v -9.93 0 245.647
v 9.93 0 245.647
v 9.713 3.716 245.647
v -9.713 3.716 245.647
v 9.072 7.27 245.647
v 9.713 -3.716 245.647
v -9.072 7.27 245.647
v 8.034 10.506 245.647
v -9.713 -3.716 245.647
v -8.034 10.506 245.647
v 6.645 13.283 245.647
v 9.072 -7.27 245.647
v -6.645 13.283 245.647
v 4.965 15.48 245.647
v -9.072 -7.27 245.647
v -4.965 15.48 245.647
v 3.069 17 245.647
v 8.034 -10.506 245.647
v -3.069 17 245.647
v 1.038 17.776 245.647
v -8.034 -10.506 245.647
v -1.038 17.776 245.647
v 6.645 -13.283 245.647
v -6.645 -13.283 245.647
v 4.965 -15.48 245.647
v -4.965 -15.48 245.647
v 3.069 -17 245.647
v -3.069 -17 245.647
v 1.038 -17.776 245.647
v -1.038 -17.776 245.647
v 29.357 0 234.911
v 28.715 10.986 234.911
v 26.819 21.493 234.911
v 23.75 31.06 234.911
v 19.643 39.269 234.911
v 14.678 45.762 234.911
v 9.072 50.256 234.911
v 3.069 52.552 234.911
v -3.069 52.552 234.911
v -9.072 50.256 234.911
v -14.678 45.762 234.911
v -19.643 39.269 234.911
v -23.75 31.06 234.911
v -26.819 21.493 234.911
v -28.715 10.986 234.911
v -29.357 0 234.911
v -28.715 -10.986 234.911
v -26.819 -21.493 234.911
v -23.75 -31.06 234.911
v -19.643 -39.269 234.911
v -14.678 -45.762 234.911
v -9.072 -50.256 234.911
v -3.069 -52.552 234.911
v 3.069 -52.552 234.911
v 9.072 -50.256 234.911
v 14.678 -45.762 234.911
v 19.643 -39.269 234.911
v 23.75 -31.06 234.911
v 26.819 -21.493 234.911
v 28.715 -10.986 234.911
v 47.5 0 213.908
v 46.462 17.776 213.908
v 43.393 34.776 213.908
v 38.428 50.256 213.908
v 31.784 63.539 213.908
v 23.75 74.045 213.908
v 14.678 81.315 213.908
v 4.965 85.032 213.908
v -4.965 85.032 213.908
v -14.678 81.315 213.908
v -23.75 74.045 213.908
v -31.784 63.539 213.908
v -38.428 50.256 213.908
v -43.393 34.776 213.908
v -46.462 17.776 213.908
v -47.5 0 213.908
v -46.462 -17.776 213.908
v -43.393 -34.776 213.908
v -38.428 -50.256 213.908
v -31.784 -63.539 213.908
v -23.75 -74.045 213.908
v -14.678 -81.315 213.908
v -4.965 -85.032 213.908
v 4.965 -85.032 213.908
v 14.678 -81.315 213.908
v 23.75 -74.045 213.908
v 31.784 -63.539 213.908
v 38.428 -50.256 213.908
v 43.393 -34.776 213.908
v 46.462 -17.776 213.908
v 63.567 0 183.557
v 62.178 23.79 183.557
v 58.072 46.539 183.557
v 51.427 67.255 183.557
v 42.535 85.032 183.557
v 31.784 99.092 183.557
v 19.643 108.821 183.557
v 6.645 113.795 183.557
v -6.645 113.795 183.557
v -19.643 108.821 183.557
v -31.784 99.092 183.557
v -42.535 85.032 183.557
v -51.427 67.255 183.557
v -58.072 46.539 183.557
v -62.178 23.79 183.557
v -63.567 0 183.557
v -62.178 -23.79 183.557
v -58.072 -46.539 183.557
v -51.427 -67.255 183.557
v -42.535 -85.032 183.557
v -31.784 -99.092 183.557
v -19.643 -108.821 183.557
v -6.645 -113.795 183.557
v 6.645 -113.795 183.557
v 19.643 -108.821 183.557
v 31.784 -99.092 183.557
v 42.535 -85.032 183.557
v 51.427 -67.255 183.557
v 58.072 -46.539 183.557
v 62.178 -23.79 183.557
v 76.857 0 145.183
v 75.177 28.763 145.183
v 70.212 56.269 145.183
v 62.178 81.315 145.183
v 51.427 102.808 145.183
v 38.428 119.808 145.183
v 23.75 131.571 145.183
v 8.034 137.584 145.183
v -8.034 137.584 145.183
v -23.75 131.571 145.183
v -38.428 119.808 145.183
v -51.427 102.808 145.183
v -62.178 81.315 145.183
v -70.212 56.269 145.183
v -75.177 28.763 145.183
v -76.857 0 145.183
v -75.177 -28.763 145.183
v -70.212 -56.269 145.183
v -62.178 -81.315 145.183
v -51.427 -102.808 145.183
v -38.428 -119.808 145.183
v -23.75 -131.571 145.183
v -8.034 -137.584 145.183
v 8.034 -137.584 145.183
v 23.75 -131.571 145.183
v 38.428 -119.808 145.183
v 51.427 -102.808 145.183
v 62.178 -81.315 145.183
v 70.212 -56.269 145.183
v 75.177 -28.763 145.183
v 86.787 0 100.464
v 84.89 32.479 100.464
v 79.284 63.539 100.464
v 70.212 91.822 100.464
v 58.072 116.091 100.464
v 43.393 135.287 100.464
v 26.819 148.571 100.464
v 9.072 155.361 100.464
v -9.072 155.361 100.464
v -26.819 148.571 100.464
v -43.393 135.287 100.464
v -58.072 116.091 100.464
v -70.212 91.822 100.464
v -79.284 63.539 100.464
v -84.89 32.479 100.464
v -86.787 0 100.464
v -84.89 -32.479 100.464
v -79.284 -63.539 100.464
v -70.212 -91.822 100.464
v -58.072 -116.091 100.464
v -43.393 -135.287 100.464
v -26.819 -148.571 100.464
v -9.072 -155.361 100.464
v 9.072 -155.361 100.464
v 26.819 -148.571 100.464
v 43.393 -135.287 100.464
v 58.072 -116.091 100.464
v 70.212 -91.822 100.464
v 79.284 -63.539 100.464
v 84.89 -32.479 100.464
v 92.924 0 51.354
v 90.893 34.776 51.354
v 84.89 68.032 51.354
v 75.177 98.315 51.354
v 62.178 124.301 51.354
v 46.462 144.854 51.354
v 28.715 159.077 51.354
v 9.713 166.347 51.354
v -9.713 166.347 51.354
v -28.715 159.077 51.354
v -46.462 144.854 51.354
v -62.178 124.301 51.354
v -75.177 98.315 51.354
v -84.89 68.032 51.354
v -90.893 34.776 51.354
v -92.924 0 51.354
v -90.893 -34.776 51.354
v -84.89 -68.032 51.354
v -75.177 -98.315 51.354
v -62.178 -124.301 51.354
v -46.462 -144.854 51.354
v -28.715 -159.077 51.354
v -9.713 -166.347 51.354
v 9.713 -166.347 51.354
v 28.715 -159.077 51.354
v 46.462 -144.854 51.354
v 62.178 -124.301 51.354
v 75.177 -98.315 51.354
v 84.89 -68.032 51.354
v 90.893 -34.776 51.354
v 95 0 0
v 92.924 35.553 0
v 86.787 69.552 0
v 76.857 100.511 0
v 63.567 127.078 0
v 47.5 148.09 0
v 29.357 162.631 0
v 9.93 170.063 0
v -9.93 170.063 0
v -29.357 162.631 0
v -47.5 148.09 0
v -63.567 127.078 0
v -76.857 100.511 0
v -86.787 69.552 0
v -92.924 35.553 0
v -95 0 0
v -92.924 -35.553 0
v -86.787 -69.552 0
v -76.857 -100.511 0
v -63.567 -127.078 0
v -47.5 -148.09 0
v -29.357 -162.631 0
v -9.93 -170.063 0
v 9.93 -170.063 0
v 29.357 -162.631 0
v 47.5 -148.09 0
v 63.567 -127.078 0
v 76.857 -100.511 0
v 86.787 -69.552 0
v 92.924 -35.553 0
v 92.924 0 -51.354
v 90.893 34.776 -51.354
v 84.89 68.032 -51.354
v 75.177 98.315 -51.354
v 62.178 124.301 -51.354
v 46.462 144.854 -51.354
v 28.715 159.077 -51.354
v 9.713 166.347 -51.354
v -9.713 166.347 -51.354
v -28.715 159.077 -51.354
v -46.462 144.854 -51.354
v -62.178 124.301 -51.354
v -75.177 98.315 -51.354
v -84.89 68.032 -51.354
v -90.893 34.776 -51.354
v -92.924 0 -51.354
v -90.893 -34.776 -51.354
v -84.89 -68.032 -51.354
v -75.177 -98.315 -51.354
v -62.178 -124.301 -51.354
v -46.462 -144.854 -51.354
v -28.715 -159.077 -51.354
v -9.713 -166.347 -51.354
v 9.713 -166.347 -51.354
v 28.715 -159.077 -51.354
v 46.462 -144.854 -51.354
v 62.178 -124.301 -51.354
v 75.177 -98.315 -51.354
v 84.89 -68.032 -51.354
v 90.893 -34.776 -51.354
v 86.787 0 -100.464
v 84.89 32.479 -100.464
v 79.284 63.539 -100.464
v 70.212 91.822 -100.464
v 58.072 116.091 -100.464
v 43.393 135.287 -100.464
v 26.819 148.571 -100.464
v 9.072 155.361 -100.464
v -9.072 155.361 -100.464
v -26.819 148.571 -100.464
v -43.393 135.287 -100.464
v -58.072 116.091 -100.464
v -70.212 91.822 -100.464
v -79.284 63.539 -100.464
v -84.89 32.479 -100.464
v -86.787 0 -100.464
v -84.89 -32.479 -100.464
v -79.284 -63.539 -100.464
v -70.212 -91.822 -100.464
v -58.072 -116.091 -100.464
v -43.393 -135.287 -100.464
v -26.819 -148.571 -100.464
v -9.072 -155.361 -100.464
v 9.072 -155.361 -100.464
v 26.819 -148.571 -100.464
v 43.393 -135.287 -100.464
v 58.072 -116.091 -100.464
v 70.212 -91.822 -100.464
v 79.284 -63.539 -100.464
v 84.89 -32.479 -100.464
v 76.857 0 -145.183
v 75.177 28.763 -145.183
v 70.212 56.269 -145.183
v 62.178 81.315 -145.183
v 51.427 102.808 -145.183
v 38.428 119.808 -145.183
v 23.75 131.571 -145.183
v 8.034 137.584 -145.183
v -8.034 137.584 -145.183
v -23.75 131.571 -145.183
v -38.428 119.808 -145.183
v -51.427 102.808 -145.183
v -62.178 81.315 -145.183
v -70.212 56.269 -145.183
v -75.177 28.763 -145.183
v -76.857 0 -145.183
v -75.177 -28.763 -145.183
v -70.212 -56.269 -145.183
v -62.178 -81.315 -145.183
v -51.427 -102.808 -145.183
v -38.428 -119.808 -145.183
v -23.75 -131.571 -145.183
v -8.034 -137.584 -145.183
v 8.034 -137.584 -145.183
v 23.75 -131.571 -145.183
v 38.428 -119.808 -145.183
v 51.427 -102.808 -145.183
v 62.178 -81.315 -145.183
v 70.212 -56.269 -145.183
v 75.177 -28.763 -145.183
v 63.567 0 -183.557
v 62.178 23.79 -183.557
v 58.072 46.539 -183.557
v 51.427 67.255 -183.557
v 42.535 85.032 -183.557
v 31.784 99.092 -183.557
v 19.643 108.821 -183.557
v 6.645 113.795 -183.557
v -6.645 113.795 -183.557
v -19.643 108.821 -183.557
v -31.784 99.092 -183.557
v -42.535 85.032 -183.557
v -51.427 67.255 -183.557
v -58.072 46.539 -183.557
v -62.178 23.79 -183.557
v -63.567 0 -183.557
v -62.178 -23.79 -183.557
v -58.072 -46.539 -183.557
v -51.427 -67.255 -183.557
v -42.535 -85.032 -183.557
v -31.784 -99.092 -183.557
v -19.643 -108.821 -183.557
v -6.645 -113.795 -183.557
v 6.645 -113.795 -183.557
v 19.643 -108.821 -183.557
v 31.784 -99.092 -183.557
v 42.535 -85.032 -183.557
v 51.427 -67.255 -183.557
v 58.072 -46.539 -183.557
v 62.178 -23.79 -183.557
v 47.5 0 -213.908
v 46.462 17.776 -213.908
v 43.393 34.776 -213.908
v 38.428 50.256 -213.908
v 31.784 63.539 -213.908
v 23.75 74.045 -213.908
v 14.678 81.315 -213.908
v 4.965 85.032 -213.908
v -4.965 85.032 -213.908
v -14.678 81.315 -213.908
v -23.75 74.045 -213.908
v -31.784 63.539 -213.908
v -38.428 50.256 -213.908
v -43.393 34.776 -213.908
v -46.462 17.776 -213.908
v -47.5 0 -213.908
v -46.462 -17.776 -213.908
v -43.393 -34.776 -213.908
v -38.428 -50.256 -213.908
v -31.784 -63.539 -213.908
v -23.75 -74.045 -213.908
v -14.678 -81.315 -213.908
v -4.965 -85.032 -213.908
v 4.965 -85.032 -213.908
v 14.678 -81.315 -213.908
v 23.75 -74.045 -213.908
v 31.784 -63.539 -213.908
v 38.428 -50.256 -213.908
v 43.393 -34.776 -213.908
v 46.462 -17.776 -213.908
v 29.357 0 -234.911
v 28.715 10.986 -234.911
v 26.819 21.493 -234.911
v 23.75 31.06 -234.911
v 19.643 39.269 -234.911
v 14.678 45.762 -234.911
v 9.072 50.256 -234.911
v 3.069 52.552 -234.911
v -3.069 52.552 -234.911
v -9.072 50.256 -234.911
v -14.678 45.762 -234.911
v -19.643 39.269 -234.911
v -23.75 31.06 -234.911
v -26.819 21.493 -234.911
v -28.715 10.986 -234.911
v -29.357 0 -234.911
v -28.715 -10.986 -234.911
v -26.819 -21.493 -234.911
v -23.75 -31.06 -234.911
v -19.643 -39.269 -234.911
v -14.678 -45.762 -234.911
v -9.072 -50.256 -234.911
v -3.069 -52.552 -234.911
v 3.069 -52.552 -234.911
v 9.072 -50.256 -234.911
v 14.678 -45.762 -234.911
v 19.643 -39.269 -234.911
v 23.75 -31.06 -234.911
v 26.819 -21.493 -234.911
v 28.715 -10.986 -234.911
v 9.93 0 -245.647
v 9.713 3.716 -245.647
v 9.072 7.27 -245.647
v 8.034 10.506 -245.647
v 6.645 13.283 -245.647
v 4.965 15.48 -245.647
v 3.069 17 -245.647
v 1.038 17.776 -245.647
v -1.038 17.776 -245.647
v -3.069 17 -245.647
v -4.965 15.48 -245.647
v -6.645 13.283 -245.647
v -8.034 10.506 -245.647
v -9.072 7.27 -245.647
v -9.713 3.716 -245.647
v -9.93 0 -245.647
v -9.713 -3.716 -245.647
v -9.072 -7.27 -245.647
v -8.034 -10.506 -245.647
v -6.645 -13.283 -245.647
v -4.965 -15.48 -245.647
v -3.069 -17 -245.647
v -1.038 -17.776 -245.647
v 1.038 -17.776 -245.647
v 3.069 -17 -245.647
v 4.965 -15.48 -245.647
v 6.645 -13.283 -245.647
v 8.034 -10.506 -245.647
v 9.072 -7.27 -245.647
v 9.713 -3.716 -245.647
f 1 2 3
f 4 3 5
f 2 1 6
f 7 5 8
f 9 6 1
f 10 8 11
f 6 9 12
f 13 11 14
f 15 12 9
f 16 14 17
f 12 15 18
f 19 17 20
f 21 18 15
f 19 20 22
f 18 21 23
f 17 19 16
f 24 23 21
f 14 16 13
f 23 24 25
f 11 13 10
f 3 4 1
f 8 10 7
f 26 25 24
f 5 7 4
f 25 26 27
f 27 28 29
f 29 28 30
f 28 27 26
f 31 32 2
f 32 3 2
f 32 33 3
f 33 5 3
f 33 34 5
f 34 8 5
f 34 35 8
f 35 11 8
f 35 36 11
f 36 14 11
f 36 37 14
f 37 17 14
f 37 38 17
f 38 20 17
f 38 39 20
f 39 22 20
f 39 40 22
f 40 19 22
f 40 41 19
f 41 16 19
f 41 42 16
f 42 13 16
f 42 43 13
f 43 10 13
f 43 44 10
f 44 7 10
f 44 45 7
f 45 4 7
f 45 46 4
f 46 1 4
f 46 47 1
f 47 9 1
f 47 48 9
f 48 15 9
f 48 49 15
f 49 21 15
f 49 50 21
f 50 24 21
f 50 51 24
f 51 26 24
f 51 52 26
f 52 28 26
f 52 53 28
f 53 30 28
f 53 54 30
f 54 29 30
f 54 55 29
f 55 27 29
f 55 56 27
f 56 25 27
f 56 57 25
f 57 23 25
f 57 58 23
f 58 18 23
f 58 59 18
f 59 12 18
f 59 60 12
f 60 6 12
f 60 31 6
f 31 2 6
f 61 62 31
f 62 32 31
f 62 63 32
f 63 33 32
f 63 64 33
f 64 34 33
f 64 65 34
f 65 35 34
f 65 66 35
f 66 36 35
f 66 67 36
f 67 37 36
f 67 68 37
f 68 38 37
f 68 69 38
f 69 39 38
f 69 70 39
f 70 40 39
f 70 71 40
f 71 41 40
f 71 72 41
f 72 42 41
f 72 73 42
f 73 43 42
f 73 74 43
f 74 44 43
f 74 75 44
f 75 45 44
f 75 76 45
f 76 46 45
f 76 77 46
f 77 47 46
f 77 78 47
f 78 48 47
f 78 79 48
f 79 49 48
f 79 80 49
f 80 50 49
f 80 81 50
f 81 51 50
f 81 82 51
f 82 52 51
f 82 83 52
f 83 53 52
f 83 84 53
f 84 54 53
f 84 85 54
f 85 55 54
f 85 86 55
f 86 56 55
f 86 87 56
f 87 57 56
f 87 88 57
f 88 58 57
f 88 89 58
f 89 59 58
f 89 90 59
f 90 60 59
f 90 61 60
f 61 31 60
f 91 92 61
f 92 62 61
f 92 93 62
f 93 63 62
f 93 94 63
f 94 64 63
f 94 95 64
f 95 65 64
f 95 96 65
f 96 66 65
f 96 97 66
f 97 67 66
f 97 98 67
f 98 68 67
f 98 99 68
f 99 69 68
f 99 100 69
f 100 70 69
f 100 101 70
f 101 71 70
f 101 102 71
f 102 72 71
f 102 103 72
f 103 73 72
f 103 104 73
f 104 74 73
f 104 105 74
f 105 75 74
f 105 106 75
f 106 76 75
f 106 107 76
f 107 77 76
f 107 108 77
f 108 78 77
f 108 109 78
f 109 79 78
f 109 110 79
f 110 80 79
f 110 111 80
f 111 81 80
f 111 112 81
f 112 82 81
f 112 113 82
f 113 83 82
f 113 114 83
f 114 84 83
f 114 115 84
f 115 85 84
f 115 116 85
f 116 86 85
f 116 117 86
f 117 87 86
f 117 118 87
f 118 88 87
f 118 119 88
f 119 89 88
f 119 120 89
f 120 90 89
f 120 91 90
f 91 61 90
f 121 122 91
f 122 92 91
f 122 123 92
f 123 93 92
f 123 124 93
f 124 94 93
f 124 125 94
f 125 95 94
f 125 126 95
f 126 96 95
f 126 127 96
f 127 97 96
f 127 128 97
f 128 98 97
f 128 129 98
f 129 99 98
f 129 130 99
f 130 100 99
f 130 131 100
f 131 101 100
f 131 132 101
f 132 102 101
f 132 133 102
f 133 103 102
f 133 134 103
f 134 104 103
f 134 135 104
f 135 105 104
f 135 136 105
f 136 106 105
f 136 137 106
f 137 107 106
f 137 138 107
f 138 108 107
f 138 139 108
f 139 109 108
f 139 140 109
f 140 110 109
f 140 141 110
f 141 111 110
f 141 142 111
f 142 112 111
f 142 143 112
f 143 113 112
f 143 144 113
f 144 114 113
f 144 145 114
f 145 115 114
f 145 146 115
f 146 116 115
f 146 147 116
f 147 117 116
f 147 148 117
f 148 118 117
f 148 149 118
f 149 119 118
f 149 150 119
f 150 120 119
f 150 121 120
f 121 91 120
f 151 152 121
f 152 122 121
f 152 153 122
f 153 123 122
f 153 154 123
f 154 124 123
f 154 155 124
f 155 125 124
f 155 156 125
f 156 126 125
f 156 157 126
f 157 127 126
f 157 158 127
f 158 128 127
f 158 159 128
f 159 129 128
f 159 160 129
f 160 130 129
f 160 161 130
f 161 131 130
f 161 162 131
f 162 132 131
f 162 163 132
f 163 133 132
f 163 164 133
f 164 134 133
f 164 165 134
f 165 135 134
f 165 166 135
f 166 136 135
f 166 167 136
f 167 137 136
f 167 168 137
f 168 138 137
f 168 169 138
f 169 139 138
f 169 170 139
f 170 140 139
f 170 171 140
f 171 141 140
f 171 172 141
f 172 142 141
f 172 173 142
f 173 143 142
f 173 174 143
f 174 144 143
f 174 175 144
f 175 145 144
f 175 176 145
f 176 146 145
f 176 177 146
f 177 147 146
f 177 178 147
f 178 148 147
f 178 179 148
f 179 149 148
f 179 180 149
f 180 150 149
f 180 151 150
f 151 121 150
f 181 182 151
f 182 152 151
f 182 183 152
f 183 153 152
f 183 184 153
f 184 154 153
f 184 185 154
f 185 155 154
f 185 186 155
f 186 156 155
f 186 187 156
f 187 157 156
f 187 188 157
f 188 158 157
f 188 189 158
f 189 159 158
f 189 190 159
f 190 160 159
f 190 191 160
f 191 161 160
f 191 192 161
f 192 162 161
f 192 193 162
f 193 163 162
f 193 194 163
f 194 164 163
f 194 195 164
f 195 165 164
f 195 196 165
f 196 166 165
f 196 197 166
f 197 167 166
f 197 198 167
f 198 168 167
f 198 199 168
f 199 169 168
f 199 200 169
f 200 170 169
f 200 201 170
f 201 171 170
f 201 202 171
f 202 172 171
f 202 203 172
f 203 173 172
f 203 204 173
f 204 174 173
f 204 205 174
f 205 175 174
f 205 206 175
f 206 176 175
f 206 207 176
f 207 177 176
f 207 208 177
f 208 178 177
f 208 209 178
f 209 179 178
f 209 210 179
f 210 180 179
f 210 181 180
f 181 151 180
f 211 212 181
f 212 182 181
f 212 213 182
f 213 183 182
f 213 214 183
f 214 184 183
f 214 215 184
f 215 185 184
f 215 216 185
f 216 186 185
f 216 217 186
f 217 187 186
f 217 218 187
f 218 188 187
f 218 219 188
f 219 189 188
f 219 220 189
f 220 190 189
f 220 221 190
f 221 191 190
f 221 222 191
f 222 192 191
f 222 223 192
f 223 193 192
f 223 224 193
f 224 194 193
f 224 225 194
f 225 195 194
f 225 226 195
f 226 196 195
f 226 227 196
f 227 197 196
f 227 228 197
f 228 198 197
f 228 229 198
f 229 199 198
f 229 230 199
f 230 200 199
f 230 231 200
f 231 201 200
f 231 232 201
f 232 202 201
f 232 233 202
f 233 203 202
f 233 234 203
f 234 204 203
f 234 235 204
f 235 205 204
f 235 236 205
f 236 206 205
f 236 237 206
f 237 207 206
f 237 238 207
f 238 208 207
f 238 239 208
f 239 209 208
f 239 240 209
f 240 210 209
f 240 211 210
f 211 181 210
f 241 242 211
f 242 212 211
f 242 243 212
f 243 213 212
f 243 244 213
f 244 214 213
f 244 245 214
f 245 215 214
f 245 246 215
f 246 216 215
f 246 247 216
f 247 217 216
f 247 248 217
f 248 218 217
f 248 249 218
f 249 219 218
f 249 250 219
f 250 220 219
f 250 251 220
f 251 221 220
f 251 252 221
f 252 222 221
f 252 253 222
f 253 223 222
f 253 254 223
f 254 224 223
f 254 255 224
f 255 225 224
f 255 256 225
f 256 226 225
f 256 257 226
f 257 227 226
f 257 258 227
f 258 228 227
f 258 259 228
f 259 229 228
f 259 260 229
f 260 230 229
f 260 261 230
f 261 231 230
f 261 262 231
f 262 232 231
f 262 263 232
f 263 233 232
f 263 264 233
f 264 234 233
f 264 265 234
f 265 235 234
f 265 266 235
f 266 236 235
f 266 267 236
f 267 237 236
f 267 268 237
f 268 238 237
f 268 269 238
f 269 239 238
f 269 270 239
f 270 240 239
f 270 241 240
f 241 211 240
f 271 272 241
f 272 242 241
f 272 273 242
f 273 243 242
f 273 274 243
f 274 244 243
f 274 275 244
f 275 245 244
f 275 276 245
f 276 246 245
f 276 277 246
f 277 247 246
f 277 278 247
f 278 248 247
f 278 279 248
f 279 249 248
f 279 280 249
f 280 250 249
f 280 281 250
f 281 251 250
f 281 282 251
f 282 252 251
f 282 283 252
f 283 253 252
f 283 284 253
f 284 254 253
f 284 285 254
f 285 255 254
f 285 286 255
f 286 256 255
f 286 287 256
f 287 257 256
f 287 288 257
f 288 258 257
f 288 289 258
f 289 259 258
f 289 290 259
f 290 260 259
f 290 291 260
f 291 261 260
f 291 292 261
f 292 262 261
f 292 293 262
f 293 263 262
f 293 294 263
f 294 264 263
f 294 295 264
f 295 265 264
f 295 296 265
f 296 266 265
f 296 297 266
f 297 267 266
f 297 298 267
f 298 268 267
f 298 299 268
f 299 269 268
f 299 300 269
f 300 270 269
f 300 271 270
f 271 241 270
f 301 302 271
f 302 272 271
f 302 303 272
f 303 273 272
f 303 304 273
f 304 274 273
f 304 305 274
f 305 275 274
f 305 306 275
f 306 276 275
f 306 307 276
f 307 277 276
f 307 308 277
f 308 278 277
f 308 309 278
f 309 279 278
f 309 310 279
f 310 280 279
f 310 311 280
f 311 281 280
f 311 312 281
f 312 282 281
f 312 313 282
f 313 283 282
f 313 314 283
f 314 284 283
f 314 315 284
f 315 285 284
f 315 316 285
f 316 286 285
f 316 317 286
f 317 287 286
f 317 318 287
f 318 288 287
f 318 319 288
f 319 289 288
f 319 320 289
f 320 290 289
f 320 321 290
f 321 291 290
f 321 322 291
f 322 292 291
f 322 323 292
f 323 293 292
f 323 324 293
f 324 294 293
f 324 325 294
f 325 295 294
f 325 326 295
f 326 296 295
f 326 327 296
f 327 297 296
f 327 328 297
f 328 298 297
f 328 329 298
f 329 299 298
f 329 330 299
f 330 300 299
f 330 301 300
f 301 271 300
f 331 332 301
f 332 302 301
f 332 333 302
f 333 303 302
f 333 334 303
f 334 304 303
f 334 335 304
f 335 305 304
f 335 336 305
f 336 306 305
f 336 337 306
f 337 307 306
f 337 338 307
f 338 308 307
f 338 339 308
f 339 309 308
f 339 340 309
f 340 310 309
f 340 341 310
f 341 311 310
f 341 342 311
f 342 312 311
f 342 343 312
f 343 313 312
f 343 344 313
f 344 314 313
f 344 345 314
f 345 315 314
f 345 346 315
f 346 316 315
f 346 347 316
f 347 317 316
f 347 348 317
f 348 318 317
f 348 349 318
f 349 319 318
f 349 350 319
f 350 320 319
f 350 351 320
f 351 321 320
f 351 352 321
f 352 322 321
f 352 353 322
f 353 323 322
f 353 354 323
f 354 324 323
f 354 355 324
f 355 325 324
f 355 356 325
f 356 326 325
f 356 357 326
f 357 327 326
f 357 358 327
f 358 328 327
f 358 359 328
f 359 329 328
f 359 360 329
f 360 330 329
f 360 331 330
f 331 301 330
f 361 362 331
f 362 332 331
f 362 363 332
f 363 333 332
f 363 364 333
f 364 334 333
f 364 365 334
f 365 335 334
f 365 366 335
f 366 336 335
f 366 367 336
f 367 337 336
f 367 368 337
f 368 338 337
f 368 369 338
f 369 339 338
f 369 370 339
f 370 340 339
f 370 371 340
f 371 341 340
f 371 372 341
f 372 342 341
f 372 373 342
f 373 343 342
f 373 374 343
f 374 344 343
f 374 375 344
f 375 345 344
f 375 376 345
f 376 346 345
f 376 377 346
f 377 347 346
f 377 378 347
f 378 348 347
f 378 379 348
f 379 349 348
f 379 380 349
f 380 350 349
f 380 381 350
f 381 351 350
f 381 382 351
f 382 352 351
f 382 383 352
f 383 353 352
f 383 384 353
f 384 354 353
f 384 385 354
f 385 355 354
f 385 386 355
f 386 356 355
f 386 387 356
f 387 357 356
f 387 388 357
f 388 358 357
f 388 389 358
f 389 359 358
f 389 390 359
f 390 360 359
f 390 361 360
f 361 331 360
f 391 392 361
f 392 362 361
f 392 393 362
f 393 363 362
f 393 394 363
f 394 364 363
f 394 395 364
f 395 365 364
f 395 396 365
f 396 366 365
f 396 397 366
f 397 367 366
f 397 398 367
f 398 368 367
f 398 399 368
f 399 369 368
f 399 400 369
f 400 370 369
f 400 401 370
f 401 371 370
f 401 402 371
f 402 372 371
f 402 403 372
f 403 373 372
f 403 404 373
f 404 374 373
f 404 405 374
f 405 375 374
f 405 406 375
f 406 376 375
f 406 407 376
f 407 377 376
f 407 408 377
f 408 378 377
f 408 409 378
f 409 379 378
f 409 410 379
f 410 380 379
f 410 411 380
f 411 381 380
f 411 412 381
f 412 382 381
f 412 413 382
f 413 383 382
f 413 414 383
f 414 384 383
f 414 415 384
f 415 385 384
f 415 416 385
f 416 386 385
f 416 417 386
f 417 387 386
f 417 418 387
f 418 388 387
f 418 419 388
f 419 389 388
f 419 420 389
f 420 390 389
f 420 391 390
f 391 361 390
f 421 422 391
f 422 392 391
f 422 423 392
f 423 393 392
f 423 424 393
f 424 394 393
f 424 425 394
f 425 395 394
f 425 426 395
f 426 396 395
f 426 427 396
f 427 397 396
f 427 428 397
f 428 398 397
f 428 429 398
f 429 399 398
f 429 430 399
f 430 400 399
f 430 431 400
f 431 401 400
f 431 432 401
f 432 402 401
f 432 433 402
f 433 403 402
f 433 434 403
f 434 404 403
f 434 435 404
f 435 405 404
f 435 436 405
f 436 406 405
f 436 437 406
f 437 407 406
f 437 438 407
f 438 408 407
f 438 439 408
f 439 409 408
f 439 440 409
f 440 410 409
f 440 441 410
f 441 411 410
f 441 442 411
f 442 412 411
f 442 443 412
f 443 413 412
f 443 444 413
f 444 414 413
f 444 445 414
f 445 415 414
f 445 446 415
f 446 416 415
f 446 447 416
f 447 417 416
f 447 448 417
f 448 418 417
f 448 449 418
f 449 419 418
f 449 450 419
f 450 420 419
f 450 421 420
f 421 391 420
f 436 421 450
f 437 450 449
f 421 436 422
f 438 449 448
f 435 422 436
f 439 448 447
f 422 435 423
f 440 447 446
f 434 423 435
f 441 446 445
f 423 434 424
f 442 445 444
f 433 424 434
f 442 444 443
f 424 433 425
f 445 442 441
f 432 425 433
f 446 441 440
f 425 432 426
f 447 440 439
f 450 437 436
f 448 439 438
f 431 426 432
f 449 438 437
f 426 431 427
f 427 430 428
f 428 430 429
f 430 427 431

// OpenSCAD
// Generated by SolidPython 1.0.1 on 2020-07-29 00:46:46


scale(v = [5, 9, 13]) {
	sphere(r = 19);
}
/***********************************************
*********      SolidPython code:      **********
************************************************
 
# import packages: SolidPython
from solid import *
from solid.utils import *
from itertools import chain, combinations, permutations


class Resize:

    def __init__(self, scad_file):
        self.scad_file = scad_file
        #self.scad_file = import_scad(scad_file)
        # cone/cylinder param:
        self.r1 = 0
        self.r2 = 0
        self.h = 0
        # rectangular prism param:
        self.w = 0
        self.l = 0
        # ellipse param:
        self.r = 0

    # import OpenScad code (file name corresponds to shape)


    # classify shape + parameters
    def assign(self, param1, param2, param3):
        if self.scad_file == 'cone.scad':
            self.r1 = param1
            self.r2 = param2
            self.h = param3
        elif self.scad_file == 'cylinder.scad':
            self.r1 = param1
            self.r2 = param2
            self.h = param3
        elif self.scad_file == 'rectangularPrism.scad':
            self.h = param1
            self.l = param2
            self.w = param3
        else:
            self.r = param1
            self.h = param2

    # resize parameters
    def iterate(self):
        x = range(3, 20, 2)
        i = 1
        if self.scad_file == 'cone.scad':
            tempList = list(permutations(x, 2))
            for temp in tempList:
                param1 = temp[0]
                param2 = temp[1]
                filepath = 'produced_scad_files/' + 'cone' + str(param1) + '_' + str(param2) + '_' + '.scad'
                scad_render_to_file(cylinder(h=param1, r1=param2, r2=0), filepath)

        elif self.scad_file == 'cylinder.scad':
            tempList = list(permutations(x, 3))
            for temp in tempList:
                param1 = temp[0]
                param2 = temp[1]
                filepath = 'produced_scad_files/' + 'cylinder' + str(param1) + '_' + str(param2) + '_' + '.scad'
                scad_render_to_file(cylinder(h=param1, r1=param2, r2=param2), filepath)

        elif self.scad_file == 'rectangularPrism.scad':
            tempList = list(permutations(x, 3))
            for temp in tempList:
                param1 = temp[0]
                param2 = temp[1]
                param3 = temp[2]
                filepath = 'produced_scad_files/' + 'rectangularPrism' + str(param1) + '_' + str(param2) + '_' + str(
                    param3) + '.scad'
                scad_render_to_file(cube(size=(param1, param2, param3)), filepath)

        elif self.scad_file == 'ellipse.scad':
            tempList = list(permutations(x, 4))
            for temp in tempList:
                param1 = temp[0]
                param2 = temp[1]
                param3 = temp[2]
                param4 = temp[3]
                filepath = 'produced_scad_files/' + 'ellipse' + str(param1) + '_' + str(param2) + '_' + str(param3) + '_' + str(param4) + '.scad'
                scad_render_to_file(scale([param1, param2, param3])(sphere(r=param4)), filepath)

    def render_to_scadfile(self):
        scad_render_to_file(scad, 'example.scad') 
 
************************************************/
